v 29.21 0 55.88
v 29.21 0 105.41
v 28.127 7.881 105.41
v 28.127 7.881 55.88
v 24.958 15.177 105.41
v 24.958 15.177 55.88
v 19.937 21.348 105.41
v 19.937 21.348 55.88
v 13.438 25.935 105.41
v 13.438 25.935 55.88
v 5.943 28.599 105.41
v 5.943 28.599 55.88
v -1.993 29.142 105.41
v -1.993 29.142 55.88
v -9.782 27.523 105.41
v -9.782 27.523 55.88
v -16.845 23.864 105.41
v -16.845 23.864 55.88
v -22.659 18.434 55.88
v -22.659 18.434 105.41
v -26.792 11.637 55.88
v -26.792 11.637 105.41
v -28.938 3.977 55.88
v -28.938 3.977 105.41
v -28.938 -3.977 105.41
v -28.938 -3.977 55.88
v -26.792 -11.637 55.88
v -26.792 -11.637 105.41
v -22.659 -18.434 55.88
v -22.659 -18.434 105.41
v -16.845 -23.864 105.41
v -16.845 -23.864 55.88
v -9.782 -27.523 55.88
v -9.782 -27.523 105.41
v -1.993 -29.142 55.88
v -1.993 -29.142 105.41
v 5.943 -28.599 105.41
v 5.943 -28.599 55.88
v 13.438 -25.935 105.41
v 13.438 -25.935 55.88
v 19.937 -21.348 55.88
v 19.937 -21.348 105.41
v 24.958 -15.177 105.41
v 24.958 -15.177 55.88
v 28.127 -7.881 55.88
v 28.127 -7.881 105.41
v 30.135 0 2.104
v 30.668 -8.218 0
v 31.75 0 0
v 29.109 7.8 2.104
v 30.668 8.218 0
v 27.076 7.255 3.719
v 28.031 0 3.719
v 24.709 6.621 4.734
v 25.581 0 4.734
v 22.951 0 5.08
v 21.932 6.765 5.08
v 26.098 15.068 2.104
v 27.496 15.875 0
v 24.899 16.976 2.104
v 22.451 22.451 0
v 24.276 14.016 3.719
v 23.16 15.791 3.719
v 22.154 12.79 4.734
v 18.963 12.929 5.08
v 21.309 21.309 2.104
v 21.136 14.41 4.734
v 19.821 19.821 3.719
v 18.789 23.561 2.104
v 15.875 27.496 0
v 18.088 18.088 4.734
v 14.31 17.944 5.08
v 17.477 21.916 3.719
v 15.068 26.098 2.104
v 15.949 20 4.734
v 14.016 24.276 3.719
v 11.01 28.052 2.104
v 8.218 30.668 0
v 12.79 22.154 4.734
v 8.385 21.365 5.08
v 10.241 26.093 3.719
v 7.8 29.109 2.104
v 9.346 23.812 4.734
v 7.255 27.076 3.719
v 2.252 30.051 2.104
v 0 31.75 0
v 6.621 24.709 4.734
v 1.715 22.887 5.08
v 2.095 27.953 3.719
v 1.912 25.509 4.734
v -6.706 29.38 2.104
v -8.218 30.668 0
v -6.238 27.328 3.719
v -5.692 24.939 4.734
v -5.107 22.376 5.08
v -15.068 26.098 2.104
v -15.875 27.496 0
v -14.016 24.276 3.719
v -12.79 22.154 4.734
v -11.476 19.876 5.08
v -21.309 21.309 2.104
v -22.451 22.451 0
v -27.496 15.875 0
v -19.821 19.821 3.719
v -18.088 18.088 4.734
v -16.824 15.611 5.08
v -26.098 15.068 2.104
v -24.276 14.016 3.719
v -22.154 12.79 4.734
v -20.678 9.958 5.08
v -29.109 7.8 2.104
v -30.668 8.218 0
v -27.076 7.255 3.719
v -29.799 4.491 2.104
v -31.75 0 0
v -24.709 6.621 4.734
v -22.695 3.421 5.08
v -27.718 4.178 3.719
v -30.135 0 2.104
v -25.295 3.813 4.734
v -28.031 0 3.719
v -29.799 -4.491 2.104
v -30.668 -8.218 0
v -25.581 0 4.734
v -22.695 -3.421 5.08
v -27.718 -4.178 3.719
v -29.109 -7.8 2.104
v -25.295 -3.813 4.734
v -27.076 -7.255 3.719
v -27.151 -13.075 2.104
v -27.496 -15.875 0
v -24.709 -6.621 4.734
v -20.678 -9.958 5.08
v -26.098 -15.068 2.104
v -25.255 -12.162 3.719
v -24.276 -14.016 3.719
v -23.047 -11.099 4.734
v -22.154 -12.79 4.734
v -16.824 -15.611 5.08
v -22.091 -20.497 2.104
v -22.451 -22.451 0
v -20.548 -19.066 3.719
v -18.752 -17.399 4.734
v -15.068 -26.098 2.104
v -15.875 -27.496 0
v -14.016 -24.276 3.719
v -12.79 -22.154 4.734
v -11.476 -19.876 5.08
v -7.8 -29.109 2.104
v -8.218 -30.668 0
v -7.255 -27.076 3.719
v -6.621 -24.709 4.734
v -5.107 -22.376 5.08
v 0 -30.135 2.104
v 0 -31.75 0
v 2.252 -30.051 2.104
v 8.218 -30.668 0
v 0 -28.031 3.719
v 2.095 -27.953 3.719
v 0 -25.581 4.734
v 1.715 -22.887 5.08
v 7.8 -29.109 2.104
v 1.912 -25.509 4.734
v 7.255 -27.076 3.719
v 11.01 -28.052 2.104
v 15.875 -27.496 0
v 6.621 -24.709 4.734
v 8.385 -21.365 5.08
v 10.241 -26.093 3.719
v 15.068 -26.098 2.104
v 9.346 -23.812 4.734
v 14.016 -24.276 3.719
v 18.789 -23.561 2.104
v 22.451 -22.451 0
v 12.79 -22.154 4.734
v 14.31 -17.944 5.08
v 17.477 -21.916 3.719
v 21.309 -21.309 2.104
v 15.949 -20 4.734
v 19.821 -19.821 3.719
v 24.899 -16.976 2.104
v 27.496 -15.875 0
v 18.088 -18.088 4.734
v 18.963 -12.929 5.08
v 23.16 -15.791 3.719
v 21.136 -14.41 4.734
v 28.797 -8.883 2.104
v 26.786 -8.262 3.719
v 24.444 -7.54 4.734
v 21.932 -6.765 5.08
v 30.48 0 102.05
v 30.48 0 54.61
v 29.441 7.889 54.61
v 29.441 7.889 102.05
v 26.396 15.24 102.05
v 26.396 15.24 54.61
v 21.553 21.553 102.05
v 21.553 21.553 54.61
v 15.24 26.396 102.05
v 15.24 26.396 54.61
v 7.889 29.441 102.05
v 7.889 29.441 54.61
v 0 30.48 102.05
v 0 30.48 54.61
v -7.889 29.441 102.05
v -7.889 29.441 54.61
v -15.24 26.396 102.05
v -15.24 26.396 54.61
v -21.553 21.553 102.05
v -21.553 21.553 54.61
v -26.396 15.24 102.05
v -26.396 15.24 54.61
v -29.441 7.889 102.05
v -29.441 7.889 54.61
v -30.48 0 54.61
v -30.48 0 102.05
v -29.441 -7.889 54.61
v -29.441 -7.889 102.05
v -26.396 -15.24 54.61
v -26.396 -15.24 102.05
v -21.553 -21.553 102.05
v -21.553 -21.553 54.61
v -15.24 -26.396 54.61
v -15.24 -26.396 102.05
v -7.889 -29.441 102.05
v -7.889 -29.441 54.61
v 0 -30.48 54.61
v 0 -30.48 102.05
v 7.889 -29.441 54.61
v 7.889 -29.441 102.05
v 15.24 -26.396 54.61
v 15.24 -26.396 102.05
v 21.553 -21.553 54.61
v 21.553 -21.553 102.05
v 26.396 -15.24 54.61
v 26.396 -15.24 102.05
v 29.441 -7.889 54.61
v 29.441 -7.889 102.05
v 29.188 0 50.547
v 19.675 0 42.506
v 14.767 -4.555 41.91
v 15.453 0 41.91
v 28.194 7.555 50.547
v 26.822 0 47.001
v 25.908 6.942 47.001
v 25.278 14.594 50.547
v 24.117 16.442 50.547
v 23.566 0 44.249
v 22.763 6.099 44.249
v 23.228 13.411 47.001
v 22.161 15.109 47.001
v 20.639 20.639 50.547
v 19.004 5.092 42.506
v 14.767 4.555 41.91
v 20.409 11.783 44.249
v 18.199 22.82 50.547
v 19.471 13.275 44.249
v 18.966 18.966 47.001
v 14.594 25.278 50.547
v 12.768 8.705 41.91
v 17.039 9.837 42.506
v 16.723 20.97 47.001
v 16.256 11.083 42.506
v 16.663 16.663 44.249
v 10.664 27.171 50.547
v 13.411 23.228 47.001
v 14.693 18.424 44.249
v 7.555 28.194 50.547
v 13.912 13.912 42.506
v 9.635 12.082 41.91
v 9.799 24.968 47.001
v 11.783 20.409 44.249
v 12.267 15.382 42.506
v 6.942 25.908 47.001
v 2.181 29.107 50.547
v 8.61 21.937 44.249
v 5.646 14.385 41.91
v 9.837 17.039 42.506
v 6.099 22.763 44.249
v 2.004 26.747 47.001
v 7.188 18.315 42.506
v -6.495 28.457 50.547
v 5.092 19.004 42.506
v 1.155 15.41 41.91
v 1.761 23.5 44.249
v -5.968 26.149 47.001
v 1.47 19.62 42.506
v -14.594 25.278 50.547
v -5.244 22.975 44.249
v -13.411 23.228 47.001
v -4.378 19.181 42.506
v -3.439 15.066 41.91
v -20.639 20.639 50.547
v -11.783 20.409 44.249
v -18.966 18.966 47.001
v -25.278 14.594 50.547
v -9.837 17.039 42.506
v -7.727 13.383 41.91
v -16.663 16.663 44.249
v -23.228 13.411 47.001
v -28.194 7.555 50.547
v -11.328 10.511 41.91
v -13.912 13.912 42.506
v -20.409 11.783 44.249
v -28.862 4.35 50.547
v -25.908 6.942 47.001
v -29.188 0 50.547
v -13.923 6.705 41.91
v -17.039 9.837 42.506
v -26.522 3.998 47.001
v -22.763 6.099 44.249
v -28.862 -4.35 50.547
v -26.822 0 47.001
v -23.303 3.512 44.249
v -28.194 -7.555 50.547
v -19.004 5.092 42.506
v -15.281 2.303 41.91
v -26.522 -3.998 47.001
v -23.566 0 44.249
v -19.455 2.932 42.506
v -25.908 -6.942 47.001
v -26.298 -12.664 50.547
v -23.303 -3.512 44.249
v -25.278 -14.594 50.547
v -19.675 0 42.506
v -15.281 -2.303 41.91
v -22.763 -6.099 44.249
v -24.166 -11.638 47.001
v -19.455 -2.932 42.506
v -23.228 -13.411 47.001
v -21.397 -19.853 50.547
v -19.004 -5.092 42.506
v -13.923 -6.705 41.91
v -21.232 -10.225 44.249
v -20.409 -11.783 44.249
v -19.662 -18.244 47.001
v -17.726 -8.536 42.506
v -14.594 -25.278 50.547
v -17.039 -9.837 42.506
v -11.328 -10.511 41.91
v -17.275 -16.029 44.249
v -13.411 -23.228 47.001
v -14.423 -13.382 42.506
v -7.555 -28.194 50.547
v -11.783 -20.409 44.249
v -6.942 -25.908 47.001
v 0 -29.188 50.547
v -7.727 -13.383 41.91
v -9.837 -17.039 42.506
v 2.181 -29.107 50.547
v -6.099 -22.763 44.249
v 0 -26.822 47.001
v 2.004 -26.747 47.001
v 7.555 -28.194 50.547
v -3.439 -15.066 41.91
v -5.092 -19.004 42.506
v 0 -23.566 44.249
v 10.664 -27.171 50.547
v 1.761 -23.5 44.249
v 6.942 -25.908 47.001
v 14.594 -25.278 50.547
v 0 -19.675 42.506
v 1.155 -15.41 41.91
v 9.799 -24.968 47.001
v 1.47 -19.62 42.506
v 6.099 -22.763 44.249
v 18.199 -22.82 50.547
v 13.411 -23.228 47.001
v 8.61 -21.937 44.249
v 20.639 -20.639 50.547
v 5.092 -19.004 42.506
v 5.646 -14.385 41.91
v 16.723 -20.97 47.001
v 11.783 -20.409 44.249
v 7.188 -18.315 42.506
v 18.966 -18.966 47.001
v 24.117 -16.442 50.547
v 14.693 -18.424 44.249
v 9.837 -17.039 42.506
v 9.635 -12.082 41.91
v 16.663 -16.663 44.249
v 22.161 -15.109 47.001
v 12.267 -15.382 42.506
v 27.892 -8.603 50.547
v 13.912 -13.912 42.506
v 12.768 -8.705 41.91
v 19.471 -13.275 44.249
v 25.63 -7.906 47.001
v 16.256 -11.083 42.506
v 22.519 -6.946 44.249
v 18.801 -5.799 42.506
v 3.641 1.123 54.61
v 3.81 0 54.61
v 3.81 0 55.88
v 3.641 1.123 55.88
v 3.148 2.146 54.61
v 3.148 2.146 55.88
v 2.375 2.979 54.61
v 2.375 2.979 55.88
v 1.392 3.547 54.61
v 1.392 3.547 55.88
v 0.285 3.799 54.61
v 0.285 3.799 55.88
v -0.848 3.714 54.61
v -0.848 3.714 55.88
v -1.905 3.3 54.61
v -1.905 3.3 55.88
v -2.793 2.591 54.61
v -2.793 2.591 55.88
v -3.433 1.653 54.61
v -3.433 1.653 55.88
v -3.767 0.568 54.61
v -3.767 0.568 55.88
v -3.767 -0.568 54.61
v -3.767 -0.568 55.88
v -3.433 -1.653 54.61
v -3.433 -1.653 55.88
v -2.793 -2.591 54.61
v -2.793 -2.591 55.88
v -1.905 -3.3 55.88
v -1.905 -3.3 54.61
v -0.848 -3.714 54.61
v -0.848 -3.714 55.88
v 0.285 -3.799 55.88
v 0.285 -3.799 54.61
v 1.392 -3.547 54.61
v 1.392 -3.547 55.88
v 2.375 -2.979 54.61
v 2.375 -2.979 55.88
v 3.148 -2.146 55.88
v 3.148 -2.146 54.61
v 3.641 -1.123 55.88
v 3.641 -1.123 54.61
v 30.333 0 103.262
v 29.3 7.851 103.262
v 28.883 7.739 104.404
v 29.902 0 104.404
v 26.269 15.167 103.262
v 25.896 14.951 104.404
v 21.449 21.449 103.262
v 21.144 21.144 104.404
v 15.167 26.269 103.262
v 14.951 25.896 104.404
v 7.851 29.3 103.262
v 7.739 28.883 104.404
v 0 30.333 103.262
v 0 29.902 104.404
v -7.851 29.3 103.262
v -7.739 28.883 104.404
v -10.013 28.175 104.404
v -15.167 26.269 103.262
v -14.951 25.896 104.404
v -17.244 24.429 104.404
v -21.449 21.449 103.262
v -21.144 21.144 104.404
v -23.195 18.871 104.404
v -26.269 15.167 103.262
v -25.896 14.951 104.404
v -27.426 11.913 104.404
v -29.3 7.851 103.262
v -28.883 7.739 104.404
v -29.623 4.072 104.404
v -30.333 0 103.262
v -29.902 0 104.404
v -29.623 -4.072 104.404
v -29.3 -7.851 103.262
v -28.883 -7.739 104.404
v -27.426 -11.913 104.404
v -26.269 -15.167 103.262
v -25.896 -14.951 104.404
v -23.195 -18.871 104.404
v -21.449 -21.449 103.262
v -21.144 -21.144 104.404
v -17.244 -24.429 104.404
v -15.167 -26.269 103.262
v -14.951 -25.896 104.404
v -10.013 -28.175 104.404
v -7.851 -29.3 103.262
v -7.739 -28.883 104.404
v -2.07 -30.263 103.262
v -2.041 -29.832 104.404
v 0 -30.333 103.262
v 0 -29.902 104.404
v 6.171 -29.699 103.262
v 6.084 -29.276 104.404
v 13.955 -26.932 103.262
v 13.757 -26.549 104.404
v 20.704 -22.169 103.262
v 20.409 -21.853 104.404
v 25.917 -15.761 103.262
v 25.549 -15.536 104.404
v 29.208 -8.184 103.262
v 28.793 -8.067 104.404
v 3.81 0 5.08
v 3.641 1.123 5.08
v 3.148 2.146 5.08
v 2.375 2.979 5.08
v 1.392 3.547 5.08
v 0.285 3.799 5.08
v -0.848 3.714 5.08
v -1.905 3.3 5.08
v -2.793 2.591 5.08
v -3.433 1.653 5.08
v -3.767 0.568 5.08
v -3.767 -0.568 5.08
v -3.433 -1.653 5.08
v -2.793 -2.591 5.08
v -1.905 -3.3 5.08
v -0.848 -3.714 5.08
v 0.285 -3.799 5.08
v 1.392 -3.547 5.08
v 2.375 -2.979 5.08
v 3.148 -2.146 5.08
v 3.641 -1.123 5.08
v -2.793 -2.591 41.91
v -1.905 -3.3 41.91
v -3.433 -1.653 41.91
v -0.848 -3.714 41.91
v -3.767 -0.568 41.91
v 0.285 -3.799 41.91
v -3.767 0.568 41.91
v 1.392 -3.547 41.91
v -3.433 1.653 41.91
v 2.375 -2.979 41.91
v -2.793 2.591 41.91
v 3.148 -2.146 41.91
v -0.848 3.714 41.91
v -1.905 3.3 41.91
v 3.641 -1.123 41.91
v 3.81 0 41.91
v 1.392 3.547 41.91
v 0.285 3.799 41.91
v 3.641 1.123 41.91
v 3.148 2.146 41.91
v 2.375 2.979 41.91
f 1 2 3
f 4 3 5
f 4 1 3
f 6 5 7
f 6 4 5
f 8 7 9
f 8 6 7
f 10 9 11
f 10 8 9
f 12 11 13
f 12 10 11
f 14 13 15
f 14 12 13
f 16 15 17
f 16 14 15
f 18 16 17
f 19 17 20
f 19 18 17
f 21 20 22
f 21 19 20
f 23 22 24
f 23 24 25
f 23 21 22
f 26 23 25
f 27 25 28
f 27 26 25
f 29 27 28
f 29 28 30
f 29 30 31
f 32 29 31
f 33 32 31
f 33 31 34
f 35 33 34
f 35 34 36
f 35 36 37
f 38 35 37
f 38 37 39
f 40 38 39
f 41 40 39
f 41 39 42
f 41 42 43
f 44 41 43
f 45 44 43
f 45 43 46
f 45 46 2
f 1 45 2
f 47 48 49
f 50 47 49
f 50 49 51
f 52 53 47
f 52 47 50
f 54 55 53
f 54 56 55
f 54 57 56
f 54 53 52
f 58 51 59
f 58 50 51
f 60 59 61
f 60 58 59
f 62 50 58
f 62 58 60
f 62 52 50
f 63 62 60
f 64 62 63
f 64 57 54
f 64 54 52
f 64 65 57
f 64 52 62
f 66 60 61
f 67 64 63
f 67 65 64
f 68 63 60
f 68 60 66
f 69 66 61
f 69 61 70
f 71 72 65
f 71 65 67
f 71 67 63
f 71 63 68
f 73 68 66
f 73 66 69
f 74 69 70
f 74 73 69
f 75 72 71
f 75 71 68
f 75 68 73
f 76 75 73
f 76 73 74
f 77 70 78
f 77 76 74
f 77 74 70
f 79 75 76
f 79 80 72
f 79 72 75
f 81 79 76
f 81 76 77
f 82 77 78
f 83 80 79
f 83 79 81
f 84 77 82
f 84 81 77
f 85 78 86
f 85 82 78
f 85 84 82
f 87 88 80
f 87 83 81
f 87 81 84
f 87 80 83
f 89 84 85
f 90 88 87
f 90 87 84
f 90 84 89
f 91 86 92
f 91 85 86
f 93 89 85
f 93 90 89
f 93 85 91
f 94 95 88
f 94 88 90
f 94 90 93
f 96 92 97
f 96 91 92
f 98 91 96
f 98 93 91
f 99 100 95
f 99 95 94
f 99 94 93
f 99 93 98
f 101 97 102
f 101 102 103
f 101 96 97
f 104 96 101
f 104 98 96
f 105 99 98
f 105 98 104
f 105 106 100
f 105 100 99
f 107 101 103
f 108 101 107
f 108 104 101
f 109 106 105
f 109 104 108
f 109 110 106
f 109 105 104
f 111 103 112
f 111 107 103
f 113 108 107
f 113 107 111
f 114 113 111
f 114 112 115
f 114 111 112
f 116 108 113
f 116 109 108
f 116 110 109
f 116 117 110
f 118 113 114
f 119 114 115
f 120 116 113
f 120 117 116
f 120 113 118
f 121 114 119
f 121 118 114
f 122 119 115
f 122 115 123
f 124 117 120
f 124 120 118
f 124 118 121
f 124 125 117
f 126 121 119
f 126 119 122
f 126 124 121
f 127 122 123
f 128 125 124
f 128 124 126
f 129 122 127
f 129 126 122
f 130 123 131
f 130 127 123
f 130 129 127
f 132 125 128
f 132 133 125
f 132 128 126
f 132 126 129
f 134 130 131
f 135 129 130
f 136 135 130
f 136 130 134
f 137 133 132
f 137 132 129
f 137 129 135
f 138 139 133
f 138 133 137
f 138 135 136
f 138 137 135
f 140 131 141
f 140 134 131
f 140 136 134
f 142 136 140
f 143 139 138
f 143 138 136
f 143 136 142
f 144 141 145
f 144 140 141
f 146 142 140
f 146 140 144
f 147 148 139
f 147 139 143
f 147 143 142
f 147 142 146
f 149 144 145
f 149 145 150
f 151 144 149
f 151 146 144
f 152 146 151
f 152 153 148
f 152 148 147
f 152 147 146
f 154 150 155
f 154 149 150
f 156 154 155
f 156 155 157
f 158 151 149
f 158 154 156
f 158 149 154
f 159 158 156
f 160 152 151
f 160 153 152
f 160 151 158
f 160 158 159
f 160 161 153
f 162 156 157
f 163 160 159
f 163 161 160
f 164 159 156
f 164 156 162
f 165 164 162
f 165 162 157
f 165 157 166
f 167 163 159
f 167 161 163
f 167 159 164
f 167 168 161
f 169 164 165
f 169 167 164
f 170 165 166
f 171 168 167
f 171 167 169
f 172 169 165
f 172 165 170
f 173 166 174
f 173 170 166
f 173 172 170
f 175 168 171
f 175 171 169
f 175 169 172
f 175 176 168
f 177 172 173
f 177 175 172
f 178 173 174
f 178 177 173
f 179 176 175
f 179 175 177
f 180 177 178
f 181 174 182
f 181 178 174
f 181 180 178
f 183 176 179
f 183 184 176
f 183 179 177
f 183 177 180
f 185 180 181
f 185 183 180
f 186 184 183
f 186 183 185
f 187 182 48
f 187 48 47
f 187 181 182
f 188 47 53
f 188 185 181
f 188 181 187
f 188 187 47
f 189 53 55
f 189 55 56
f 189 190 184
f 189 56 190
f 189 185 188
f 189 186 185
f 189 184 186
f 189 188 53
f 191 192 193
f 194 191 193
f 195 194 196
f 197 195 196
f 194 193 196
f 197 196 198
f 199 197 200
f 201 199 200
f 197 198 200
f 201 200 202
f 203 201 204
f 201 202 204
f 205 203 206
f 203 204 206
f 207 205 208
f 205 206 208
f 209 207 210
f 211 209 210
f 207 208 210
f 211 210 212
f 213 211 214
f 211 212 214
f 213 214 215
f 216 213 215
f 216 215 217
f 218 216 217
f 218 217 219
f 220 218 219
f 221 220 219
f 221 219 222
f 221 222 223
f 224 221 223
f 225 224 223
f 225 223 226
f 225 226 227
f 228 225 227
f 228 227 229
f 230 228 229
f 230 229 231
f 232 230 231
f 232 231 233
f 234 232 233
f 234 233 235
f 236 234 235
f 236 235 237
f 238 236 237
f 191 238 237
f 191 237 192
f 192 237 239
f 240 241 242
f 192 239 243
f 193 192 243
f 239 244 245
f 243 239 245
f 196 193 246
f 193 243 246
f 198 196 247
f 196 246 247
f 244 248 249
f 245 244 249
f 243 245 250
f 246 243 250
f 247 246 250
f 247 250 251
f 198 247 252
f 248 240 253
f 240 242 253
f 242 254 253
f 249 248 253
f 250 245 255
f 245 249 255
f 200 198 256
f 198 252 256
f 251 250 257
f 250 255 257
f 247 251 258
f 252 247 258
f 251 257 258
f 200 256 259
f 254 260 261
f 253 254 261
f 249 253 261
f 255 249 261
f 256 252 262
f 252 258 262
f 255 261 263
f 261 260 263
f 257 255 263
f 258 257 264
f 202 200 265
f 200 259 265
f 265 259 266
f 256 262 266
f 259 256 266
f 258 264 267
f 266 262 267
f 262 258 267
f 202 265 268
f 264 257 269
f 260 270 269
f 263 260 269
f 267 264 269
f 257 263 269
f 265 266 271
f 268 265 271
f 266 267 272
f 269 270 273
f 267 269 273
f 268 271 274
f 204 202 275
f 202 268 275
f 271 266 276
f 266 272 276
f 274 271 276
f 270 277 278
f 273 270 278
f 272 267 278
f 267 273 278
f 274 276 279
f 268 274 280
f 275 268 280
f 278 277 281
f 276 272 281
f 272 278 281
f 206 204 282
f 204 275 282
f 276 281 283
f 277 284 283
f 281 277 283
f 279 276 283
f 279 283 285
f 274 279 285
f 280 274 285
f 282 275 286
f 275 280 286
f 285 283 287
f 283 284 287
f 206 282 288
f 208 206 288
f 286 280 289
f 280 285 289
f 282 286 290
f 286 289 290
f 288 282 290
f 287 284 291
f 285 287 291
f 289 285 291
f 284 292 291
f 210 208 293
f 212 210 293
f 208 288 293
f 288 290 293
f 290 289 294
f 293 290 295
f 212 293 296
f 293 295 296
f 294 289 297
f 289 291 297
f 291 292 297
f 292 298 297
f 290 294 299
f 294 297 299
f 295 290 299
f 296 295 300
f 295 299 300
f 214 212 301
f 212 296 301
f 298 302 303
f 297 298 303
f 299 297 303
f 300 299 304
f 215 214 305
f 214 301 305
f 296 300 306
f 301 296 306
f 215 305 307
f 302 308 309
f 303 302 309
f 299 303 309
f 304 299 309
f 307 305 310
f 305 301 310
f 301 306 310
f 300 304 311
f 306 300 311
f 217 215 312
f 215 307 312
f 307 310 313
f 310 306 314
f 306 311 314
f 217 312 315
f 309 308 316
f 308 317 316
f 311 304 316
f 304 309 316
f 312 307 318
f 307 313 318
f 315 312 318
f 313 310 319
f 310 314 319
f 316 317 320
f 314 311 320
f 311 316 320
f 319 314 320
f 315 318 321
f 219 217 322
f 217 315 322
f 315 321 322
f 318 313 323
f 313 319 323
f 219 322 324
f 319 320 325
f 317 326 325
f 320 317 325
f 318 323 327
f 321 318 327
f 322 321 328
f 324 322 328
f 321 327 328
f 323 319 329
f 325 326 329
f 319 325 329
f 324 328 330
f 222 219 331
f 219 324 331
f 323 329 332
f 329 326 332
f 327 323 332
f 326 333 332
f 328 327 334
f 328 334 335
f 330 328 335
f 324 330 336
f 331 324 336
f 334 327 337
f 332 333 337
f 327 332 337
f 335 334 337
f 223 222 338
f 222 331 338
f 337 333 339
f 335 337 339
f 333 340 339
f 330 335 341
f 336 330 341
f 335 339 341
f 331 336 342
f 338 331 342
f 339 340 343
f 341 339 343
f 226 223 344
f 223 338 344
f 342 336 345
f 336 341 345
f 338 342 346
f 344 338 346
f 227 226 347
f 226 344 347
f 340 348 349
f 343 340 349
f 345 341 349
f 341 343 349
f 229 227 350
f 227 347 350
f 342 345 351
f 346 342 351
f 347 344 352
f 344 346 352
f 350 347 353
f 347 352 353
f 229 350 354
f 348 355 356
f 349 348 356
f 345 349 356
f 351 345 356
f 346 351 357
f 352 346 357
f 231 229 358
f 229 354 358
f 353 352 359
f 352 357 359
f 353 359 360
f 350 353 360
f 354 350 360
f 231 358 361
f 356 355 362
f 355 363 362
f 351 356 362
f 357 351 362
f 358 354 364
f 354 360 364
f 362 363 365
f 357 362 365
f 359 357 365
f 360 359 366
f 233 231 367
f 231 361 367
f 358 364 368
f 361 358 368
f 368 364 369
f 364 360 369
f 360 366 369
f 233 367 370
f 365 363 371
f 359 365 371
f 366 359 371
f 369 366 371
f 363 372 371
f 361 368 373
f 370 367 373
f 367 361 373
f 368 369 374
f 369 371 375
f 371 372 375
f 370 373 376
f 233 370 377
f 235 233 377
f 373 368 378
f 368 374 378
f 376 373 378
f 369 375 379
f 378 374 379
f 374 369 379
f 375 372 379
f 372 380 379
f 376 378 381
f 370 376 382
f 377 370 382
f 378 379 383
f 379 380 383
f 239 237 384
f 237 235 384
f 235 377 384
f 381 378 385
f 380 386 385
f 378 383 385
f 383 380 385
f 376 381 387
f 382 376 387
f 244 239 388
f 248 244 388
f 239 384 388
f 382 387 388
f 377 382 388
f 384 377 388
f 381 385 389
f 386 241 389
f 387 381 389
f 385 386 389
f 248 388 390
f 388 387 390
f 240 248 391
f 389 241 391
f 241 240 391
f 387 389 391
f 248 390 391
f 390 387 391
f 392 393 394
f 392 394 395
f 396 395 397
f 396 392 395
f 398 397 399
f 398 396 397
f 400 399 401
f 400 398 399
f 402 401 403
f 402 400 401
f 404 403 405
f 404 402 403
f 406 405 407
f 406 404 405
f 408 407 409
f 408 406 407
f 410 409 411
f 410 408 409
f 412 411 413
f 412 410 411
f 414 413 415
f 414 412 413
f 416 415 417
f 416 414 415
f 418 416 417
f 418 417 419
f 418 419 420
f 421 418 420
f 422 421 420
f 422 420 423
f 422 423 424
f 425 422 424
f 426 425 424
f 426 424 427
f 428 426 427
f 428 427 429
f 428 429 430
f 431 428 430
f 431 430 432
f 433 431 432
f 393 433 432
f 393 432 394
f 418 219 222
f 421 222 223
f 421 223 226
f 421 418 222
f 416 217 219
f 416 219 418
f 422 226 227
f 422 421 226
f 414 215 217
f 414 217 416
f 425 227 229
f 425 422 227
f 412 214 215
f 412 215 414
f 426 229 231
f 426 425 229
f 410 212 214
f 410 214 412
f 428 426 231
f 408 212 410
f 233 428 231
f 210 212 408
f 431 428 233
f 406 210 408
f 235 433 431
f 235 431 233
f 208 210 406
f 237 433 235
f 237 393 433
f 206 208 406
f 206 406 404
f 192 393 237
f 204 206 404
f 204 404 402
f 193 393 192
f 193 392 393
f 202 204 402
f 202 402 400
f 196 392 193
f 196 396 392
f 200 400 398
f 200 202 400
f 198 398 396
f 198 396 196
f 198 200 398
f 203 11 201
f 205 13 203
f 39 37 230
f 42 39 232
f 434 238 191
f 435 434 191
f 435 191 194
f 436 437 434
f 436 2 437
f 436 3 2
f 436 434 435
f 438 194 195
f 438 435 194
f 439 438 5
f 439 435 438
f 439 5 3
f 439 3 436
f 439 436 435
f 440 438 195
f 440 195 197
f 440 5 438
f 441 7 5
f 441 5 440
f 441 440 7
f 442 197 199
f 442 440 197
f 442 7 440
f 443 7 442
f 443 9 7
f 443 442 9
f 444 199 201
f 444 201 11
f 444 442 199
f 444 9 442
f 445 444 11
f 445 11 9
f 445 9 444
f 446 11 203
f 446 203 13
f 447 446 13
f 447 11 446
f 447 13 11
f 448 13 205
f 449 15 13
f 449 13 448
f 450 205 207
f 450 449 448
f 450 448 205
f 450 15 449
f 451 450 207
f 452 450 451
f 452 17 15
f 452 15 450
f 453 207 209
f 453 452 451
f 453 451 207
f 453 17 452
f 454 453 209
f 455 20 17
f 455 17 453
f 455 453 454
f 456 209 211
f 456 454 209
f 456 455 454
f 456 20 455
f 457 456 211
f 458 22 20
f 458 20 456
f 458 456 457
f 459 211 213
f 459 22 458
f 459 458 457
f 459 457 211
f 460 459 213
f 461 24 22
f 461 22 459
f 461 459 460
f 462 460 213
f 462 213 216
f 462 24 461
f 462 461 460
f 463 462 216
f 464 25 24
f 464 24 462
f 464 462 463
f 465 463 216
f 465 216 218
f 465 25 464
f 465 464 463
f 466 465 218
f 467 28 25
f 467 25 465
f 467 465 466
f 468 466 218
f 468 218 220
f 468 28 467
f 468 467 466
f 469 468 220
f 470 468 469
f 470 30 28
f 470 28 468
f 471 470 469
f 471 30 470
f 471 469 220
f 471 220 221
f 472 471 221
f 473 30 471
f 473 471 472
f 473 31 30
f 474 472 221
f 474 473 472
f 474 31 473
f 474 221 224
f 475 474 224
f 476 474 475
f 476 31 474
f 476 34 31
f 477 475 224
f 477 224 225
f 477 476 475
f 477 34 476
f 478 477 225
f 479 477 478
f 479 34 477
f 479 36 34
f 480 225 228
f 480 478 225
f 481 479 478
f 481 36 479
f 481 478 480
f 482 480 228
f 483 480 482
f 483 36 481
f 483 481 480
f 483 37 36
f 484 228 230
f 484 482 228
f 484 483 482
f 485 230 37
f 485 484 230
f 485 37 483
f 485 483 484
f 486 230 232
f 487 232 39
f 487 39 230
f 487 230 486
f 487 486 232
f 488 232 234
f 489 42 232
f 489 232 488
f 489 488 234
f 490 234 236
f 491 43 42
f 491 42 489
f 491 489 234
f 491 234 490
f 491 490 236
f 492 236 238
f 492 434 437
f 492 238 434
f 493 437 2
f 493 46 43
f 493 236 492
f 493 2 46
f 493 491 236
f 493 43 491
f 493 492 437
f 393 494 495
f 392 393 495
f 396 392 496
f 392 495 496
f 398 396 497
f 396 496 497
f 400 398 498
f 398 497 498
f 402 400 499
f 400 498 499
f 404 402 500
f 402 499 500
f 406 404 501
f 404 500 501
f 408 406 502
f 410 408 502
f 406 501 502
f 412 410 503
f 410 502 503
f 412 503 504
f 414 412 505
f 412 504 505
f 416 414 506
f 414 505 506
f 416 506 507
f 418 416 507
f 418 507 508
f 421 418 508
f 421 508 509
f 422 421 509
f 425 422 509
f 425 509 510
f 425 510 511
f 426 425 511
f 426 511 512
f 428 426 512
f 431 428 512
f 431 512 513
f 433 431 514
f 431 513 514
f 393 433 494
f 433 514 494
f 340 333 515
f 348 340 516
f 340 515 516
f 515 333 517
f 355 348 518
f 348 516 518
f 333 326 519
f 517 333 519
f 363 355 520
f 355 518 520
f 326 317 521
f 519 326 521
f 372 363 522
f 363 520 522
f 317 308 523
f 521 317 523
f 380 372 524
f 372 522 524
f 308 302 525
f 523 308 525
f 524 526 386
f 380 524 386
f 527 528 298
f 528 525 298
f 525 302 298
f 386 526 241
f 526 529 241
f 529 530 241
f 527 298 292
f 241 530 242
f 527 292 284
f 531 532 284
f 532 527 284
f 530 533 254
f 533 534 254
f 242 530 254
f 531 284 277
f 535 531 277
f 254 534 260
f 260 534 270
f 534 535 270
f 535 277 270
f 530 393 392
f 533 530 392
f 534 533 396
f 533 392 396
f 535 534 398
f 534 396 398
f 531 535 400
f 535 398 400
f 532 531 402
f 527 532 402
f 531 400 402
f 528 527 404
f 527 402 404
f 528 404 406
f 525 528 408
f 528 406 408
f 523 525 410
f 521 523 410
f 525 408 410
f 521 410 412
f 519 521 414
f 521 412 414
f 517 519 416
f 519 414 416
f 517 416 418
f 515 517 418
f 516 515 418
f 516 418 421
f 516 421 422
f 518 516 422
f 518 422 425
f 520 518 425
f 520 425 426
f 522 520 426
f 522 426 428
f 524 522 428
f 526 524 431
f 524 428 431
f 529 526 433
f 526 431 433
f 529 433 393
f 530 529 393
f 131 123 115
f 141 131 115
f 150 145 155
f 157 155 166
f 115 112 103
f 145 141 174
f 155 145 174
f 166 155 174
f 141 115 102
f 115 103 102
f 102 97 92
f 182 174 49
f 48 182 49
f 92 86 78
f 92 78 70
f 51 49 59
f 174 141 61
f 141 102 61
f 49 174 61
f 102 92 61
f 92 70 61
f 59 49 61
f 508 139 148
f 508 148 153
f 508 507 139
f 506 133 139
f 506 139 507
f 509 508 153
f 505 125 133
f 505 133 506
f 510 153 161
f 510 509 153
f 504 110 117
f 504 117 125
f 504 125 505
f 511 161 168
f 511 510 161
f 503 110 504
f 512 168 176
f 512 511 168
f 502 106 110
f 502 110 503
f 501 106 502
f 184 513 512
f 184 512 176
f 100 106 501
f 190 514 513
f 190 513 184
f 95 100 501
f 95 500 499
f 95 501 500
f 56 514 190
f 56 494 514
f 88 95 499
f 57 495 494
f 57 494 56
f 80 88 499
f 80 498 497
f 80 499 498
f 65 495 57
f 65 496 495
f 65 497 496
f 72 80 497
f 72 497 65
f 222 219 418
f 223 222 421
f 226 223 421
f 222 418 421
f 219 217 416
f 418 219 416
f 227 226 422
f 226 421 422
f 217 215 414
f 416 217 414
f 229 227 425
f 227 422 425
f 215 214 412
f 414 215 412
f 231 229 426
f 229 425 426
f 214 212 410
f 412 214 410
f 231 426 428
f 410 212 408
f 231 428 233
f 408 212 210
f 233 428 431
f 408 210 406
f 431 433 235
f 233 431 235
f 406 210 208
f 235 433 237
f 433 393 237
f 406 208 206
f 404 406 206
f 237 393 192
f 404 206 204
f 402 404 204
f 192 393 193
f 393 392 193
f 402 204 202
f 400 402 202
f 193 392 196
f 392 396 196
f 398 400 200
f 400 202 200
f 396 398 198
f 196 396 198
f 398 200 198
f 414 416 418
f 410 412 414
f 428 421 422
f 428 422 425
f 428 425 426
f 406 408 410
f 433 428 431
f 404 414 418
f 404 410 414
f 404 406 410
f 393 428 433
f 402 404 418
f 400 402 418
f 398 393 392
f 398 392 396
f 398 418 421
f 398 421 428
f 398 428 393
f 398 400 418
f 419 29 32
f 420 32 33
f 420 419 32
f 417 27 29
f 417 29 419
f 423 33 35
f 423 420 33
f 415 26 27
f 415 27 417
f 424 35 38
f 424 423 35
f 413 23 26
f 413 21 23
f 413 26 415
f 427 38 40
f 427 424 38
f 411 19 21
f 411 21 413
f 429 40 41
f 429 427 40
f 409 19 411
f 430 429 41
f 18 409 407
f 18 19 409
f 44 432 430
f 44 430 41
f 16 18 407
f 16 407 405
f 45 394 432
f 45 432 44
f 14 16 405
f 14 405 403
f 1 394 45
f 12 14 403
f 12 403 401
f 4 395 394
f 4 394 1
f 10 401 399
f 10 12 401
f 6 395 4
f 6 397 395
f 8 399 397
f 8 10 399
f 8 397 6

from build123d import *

# Parameters (mm, degrees)
F0_R     = 31.75
F1_DEPTH = 5.08
F3_R     = 3.81
F4_DEPTH = 49.53
F5_R     = 30.48
F5_R_2   = 3.81
F6_DEPTH = 50.8
F7_DEPTH = 12.7
F9_T     = -1.27


# Not quite as in the source:
# - a fillet or chamfer that OpenCascade refuses, or shapes differently, is made with other operations: its cross-section is extruded or revolved along the edge and cut away or added


with BuildPart() as f1:
    # F0 (on Top) → F1 (new body)
    with BuildSketch(Plane.XY):
        Circle(F0_R)
    extrude(amount=F1_DEPTH)

    # F2: fillet of radius 10.16 on 1 edges, made by hand

    # F2_s1 → F2_t2 (revolve, cut)
    with BuildSketch(Plane.XZ):
        with BuildLine():
            ThreePointArc((31.75, 0), (28.0311818975, 3.7188181024), (22.9511818975, 5.08))
            Line((22.9511818975, 5.08), (31.75, 5.08))
            Line((31.75, 5.08), (31.75, 0))
        make_face()
    revolve(axis=Axis((0, 0, 5.08), (0, 0, 1)), mode=Mode.SUBTRACT)

    # F3 (on face) → F4 (join)
    with BuildSketch(Plane.XY.offset(5.08)):
        Circle(F3_R)
    extrude(amount=F4_DEPTH)


with BuildPart() as f6:
    # F5 (on face) → F6 (new body)
    with BuildSketch(Plane.XY.offset(54.61)):
        Circle(F5_R)
        Circle(F5_R_2, mode=Mode.SUBTRACT)
    extrude(amount=F6_DEPTH)


with BuildPart() as f7:
    # F7 (new): a face of the model
    f7_faces = [f6.part.faces().sort_by_distance(p)[0] for p in [
        (-29.6178954124, 0, 54.61),
    ]]
    extrude(f7_faces, amount=F7_DEPTH)

    # F8: fillet of radius 15.24 on 1 edges, made by hand

    # F8_s1 → F8_t2 (revolve, cut)
    with BuildSketch(Plane.XZ):
        with BuildLine():
            ThreePointArc((30.48, 54.61), (25.2905350503, 45.5102577348), (15.4531573509, 41.91))
            Line((15.4531573509, 41.91), (30.48, 41.91))
            Line((30.48, 41.91), (30.48, 54.61))
        make_face()
    revolve(axis=Axis((0, 0, 41.91), (0, 0, 1)), mode=Mode.SUBTRACT)


with BuildPart() as f6_1:
    add(f6.part)

    # F9
    f9_openings = [f6_1.faces().sort_by_distance(p)[0] for p in [
        (-29.617895, 0, 105.41),
        (-3.81, 0, 80.01),
    ]]
    offset(amount=F9_T, openings=f9_openings)

    # F10: fillet of radius 5.08 on 1 edges, made by hand

    # F10_s1 → F10_t2 (revolve, cut)
    with BuildSketch(Plane.XZ):
        with BuildLine():
            ThreePointArc((30.48, 102.0498958349), (30.1519048812, 103.8459470592), (29.21, 105.41))
            Line((29.21, 105.41), (30.48, 105.41))
            Line((30.48, 105.41), (30.48, 102.0498958349))
        make_face()
    revolve(axis=Axis((0, 0, 105.41), (0, 0, 1)), mode=Mode.SUBTRACT)


solid = Compound([f1.part, f7.part, f6_1.part])
